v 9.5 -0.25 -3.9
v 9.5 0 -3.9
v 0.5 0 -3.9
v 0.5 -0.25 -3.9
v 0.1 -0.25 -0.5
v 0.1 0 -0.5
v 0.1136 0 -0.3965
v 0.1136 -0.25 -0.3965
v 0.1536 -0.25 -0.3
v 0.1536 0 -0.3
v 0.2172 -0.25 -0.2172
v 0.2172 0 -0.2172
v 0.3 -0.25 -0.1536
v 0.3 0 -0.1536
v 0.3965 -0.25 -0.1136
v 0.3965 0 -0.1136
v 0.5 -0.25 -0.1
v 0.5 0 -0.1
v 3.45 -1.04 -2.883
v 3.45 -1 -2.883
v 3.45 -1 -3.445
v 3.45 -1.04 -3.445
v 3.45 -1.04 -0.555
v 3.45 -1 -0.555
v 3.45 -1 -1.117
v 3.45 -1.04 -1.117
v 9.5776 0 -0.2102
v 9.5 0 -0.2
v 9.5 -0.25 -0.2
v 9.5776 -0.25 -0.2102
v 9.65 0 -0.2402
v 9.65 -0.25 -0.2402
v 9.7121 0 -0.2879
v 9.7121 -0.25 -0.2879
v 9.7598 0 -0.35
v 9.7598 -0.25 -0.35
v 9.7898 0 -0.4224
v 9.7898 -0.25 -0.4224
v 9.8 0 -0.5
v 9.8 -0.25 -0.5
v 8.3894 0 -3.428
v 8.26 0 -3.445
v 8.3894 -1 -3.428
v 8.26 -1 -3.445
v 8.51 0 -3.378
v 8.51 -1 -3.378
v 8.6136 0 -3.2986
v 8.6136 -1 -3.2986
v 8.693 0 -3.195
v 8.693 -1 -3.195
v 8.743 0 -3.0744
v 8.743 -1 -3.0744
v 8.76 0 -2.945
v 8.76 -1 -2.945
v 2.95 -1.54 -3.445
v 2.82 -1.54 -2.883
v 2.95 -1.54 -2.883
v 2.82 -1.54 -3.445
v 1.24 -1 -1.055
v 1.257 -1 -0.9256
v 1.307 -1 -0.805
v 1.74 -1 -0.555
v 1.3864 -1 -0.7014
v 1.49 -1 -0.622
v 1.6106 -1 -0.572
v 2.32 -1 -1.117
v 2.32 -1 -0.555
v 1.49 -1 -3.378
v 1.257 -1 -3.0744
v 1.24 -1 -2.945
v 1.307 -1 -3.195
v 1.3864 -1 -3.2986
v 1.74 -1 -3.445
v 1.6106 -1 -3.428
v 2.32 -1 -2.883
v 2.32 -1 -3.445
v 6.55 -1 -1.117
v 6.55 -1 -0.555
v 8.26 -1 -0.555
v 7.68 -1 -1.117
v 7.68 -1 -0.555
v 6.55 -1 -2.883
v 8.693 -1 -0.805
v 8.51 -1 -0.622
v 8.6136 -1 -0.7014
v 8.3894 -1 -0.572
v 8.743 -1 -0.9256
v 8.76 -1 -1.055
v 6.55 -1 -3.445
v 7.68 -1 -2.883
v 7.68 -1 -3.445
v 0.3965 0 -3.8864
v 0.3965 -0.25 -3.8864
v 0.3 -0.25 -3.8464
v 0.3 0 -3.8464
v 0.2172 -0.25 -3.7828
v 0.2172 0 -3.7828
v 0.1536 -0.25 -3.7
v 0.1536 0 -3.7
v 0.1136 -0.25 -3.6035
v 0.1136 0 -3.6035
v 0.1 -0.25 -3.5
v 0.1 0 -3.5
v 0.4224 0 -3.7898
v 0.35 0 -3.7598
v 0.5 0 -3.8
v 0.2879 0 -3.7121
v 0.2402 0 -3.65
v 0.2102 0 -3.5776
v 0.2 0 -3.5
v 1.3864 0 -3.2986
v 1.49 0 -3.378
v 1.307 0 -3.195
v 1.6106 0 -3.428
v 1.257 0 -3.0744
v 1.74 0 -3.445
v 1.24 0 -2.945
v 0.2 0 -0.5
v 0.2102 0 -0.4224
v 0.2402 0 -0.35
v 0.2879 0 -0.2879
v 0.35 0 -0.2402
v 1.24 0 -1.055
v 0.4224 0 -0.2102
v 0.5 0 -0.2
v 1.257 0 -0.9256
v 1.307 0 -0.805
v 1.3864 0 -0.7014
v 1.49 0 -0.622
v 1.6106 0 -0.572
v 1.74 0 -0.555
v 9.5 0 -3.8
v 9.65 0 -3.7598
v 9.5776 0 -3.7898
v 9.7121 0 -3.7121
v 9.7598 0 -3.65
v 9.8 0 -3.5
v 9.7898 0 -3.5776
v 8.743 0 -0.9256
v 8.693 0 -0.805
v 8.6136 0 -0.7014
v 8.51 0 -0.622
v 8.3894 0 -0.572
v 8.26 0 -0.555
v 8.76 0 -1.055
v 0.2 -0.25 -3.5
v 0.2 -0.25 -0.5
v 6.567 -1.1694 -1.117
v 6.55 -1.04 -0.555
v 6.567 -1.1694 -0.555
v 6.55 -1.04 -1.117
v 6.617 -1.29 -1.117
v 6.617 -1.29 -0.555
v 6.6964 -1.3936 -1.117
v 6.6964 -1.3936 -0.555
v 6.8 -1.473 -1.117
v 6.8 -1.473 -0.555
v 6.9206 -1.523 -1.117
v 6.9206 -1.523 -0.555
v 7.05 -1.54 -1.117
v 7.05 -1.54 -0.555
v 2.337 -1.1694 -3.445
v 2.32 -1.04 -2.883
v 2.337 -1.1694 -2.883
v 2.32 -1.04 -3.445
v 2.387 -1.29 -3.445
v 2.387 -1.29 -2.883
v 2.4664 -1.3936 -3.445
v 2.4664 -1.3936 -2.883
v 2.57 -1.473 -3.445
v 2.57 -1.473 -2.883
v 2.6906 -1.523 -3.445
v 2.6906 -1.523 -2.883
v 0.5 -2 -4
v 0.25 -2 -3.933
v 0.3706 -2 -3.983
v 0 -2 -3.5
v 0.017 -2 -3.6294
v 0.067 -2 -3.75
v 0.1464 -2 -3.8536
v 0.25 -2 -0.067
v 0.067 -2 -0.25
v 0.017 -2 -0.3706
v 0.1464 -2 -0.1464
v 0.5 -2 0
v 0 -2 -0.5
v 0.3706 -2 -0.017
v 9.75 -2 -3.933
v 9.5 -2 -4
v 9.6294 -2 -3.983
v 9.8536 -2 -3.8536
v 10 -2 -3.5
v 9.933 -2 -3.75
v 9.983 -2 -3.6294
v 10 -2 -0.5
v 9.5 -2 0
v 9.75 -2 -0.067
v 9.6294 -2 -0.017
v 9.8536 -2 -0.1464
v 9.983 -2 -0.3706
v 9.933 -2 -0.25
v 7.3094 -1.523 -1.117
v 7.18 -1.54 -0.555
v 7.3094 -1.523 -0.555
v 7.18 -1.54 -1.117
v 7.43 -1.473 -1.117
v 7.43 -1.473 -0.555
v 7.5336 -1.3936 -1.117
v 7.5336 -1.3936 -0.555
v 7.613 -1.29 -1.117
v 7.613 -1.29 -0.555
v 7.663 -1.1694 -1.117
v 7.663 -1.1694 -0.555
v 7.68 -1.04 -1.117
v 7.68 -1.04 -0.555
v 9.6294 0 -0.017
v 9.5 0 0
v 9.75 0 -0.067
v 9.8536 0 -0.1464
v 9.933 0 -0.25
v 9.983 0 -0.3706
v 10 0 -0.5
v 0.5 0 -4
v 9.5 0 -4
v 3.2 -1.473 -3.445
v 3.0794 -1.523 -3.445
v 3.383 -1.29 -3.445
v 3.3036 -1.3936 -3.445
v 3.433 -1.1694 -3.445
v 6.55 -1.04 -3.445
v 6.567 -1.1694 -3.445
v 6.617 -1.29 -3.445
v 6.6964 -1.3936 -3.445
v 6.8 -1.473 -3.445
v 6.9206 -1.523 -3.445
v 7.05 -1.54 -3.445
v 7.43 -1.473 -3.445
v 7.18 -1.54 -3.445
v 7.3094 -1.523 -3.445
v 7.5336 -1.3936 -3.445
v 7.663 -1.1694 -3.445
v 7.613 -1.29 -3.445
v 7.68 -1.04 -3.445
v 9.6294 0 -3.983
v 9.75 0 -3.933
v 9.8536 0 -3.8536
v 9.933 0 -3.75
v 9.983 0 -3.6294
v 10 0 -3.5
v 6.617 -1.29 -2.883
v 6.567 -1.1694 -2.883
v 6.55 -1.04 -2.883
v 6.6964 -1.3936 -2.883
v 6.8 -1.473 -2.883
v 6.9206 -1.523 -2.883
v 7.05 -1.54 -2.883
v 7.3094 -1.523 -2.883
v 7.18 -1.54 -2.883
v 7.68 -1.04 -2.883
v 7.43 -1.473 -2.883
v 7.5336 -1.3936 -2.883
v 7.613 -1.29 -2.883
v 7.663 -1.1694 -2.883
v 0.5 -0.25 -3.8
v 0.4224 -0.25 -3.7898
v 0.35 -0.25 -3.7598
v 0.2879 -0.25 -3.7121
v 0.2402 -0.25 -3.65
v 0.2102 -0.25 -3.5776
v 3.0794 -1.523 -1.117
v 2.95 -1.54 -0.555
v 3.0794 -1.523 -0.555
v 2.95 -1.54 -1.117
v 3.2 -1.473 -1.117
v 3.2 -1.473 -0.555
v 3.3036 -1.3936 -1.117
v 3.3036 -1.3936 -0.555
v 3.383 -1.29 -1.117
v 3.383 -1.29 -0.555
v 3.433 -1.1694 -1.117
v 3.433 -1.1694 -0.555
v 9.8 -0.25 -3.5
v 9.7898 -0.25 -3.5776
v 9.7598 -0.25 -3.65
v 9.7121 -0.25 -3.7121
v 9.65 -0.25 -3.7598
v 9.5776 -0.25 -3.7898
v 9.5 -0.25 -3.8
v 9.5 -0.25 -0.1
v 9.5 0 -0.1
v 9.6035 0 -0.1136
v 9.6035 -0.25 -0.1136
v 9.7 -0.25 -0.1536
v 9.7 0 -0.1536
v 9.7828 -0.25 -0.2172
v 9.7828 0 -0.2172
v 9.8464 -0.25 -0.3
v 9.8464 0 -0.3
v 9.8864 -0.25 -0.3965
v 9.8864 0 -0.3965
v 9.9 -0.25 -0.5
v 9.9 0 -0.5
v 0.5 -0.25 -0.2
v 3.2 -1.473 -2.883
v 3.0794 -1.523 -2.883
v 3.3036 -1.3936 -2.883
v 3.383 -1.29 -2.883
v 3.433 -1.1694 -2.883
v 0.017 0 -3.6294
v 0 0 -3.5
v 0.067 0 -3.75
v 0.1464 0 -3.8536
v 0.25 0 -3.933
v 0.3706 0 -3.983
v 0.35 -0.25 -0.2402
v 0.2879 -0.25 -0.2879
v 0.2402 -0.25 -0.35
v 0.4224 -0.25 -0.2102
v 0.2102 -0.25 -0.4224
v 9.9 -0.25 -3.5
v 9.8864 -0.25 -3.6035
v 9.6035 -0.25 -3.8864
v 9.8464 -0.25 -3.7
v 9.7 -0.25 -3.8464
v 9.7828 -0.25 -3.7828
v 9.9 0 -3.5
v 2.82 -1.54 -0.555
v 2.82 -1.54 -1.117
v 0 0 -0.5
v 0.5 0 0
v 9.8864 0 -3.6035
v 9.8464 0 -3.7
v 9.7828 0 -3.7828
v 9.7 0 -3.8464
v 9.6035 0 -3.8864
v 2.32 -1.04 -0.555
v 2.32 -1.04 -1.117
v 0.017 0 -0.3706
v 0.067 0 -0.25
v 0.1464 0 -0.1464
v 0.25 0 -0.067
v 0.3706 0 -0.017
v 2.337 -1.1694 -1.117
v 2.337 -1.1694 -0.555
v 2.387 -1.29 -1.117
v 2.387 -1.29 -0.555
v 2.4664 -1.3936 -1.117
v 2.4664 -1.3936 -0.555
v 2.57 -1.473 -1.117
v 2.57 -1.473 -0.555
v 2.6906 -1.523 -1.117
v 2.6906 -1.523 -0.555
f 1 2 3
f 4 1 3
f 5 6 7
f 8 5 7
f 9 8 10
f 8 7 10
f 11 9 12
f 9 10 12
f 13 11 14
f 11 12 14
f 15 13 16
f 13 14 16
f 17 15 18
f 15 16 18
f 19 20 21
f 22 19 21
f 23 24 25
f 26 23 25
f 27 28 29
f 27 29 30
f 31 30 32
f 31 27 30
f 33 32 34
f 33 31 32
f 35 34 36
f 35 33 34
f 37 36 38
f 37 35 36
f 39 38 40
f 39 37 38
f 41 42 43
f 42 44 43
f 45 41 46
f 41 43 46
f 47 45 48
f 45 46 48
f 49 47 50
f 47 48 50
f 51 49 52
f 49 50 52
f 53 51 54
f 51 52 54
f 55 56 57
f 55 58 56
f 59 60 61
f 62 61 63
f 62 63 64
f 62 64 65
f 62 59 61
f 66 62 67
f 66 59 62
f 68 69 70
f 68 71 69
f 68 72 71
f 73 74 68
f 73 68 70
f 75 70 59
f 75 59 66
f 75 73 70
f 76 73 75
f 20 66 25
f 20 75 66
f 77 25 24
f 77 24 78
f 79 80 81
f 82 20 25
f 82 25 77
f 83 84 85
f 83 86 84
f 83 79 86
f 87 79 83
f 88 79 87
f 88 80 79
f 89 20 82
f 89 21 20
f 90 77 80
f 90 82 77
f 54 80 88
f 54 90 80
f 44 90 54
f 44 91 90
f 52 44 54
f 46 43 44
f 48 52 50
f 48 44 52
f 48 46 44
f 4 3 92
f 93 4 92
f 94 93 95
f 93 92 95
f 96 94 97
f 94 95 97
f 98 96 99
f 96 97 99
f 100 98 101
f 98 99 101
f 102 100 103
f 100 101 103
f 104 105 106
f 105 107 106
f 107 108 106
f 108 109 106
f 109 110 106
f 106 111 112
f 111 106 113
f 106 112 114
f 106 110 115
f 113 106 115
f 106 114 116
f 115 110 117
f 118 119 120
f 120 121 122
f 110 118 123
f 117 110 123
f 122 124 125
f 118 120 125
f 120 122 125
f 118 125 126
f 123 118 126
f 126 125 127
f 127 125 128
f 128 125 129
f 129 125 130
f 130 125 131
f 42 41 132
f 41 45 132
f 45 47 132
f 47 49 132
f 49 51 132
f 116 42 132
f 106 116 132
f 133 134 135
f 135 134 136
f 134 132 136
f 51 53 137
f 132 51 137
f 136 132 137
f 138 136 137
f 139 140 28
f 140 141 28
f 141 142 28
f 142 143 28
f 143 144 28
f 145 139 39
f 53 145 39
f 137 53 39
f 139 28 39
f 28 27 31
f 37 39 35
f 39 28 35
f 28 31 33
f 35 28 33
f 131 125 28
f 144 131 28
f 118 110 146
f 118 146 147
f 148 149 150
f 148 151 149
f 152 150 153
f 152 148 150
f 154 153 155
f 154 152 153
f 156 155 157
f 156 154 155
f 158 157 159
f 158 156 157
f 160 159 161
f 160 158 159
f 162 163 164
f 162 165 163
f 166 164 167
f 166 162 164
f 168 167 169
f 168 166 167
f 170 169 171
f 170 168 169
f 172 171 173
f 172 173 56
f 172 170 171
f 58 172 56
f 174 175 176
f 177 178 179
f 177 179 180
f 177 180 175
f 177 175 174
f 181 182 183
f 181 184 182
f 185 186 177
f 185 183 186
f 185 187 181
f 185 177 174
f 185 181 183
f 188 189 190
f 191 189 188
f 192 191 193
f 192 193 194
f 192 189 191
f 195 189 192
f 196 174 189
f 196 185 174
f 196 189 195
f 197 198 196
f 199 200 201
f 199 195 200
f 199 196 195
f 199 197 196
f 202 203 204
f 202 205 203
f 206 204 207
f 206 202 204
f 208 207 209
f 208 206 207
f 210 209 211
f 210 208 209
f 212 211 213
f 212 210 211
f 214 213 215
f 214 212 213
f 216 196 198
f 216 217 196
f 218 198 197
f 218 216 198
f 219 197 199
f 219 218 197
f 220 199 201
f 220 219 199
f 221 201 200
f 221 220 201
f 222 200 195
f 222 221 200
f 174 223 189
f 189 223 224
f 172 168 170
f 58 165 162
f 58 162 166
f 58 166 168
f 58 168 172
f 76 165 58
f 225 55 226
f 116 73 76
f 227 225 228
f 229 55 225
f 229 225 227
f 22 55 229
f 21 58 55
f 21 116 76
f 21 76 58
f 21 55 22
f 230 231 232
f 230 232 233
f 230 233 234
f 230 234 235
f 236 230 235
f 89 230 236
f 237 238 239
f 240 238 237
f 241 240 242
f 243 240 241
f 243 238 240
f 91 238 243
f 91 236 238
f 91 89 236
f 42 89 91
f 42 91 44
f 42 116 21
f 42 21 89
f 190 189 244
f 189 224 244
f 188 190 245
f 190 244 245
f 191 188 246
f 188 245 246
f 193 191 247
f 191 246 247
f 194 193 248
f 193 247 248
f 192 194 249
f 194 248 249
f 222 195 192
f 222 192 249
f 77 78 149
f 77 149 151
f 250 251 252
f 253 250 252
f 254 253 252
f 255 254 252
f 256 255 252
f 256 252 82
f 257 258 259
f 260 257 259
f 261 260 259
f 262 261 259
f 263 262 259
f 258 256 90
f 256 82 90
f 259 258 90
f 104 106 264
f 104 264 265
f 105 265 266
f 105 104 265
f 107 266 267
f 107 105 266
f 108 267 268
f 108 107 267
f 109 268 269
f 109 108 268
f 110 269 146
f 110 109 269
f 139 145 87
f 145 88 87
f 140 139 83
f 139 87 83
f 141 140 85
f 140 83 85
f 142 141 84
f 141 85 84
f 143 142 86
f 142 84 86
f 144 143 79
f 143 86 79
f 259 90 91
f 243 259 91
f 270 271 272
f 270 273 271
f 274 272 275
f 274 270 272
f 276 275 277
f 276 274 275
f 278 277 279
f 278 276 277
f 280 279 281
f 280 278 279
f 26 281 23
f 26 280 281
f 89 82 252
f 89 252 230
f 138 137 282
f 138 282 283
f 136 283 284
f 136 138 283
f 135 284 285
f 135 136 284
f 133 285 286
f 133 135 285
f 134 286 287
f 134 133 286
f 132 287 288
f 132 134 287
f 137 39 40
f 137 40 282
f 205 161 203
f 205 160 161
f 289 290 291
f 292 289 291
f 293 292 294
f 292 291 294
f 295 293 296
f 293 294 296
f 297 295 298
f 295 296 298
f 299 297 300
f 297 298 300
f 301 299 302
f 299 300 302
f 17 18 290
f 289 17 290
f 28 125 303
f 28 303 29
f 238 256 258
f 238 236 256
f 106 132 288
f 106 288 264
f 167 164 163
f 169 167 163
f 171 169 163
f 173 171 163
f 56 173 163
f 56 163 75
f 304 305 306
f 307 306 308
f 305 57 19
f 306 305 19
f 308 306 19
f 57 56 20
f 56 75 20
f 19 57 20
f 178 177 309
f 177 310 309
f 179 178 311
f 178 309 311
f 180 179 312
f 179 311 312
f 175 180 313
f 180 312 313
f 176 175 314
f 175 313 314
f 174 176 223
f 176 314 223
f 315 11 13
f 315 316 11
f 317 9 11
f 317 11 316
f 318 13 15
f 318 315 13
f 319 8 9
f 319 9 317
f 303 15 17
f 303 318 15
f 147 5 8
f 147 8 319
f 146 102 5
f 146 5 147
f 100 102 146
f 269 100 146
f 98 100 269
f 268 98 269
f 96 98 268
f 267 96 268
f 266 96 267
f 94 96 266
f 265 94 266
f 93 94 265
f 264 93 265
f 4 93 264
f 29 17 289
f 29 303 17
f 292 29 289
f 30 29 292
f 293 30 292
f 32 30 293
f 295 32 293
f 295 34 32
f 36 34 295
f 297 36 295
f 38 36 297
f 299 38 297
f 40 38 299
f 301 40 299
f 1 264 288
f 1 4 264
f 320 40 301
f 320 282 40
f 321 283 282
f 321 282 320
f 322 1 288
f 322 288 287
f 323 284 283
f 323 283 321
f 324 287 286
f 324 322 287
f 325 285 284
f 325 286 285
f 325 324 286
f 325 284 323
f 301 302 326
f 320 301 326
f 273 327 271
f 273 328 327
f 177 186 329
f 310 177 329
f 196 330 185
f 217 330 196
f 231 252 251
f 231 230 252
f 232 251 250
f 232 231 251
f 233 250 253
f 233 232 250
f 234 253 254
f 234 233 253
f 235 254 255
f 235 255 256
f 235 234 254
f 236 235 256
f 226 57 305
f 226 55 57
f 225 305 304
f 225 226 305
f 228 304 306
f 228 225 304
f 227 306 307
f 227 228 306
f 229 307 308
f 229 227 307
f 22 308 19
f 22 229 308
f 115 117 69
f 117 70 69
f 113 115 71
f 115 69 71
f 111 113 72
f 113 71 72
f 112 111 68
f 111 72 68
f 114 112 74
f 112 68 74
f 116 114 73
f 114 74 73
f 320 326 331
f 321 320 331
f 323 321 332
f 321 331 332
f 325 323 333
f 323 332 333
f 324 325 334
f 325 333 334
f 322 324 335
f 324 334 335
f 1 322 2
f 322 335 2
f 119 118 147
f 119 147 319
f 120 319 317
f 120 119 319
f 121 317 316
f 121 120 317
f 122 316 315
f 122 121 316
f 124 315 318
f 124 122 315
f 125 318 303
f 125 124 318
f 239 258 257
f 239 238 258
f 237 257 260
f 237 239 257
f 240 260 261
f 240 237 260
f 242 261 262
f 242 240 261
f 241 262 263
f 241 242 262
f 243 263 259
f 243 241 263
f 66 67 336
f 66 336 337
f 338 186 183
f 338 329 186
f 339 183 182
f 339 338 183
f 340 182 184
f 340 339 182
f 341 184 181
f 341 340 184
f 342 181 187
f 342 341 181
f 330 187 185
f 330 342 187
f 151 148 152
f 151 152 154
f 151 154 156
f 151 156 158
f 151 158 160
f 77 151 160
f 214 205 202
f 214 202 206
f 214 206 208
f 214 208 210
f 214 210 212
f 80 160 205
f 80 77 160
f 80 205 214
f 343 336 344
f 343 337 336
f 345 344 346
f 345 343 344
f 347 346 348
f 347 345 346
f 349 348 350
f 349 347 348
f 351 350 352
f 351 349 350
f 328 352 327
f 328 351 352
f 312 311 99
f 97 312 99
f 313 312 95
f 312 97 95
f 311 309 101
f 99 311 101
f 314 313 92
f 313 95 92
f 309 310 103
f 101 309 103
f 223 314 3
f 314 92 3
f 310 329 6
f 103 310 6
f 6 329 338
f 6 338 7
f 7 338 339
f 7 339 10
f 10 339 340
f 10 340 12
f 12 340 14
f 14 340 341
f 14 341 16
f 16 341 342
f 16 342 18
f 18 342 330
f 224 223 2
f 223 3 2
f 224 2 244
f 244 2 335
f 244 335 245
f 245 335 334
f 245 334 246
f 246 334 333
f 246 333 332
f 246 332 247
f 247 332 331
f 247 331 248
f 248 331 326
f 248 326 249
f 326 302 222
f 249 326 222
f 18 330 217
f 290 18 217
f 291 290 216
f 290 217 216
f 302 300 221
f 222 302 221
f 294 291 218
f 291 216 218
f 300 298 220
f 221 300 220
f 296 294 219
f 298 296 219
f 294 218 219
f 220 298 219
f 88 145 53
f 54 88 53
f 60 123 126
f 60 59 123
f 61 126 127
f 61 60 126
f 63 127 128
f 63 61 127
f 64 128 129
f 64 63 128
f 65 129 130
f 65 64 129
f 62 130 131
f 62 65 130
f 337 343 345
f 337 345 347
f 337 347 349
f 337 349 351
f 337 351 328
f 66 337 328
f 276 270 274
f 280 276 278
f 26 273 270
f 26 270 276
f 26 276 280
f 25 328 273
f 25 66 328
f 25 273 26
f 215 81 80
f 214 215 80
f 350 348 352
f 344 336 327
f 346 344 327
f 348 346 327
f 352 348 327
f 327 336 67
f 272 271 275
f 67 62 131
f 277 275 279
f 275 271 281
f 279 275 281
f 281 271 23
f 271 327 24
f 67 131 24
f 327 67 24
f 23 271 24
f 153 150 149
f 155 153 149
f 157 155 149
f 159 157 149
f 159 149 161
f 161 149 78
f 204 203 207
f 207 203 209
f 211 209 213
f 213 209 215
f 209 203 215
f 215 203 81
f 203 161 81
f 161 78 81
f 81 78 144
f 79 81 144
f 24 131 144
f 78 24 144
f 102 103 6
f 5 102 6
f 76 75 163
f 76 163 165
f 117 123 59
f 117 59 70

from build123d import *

# Parameters (mm, degrees)
SKETCH1_W           = 10
SKETCH1_H           = 2
BOSS_EXTRUDE1_DEPTH = 4
SKETCH2_W           = 7.52
SKETCH2_H           = 2.89
CUT_EXTRUDE1_DEPTH  = 1
FILLET1_R           = 0.5
FILLET2_R           = 0.5
SKETCH5_W           = 1.13
SKETCH5_H           = 0.562
CUT_EXTRUDE3_DEPTH  = 0.54
CUT_EXTRUDE8_DEPTH  = 0.25
FILLET4_R           = 0.5


with BuildPart() as part:
    # Sketch1 → Boss-Extrude1 (new body)
    with BuildSketch(Plane.XY):
        with Locations((5, -1)):
            Rectangle(SKETCH1_W, SKETCH1_H)
    extrude(amount=-BOSS_EXTRUDE1_DEPTH)

    # Sketch2 → Cut-Extrude1 (cut)
    with BuildSketch(Plane(origin=(0, 0, 0), x_dir=(1, 0, 0), z_dir=(0, 1, 0))):
        with Locations((5, 2)):
            Rectangle(SKETCH2_W, SKETCH2_H)
    extrude(amount=-CUT_EXTRUDE1_DEPTH, mode=Mode.SUBTRACT)

    # Fillet1
    fillet1_edges = [part.edges().sort_by_distance(p)[0] for p in [
        (10, -1, -4),
        (0, -1, -4),
        (10, -1, 0),
        (0, -1, 0),
    ]]
    fillet(fillet1_edges, radius=FILLET1_R)

    # Fillet2
    fillet2_edges = [part.edges().sort_by_distance(p)[0] for p in [
        (8.76, -0.5, -3.445),
        (8.76, -0.5, -0.555),
        (1.24, -0.5, -0.555),
        (1.24, -0.5, -3.445),
    ]]
    fillet(fillet2_edges, radius=FILLET2_R)

    # Sketch5 → Cut-Extrude3 (cut)
    with BuildSketch(Plane(origin=(0, -1, 0), x_dir=(1, 0, 0), z_dir=(0, 1, 0))):
        with Locations((2.885, 3.164)):
            Rectangle(SKETCH5_W, SKETCH5_H)
        with Locations((7.115, 3.164)):
            Rectangle(SKETCH5_W, SKETCH5_H)
        with Locations((7.115, 0.836)):
            Rectangle(SKETCH5_W, SKETCH5_H)
        with Locations((2.885, 0.836)):
            Rectangle(SKETCH5_W, SKETCH5_H)
    extrude(amount=-CUT_EXTRUDE3_DEPTH, mode=Mode.SUBTRACT)

    # Sketch9 → Cut-Extrude8 (cut)
    with BuildSketch(Plane(origin=(0, 0, 0), x_dir=(1, 0, 0), z_dir=(0, 1, 0))):
        with BuildLine():
            Line((9.9, 0.5), (9.9, 3.5))
            ThreePointArc((9.9, 3.5), (9.782842712, 3.782842712), (9.5, 3.9))
            Line((9.5, 3.9), (0.5, 3.9))
            ThreePointArc((0.5, 3.9), (0.217157288, 3.782842712), (0.1, 3.5))
            Line((0.1, 3.5), (0.1, 0.5))
            ThreePointArc((0.1, 0.5), (0.217157288, 0.217157288), (0.5, 0.1))
            Line((0.5, 0.1), (9.5, 0.1))
            ThreePointArc((9.5, 0.1), (9.782842712, 0.217157288), (9.9, 0.5))
        make_face()
        with BuildLine():
            Line((0.5, 0.2), (9.5, 0.2))
            ThreePointArc((9.5, 0.2), (9.712132034, 0.287867966), (9.8, 0.5))
            Line((9.8, 0.5), (9.8, 3.5))
            ThreePointArc((9.8, 3.5), (9.712132034, 3.712132034), (9.5, 3.8))
            Line((9.5, 3.8), (0.5, 3.8))
            ThreePointArc((0.5, 3.8), (0.287867966, 3.712132034), (0.2, 3.5))
            Line((0.2, 3.5), (0.2, 0.5))
            ThreePointArc((0.2, 0.5), (0.287867966, 0.287867966), (0.5, 0.2))
        make_face(mode=Mode.SUBTRACT)
    extrude(amount=-CUT_EXTRUDE8_DEPTH, mode=Mode.SUBTRACT)

    # Fillet4
    fillet4_edges = [part.edges().sort_by_distance(p)[0] for p in [
        (2.32, -1.54, -3.164),
        (3.45, -1.54, -3.164),
        (2.32, -1.54, -0.836),
        (3.45, -1.54, -0.836),
        (6.55, -1.54, -0.836),
        (7.68, -1.54, -0.836),
        (6.55, -1.54, -3.164),
        (7.68, -1.54, -3.164),
    ]]
    fillet(fillet4_edges, radius=FILLET4_R)


solid = part.part
